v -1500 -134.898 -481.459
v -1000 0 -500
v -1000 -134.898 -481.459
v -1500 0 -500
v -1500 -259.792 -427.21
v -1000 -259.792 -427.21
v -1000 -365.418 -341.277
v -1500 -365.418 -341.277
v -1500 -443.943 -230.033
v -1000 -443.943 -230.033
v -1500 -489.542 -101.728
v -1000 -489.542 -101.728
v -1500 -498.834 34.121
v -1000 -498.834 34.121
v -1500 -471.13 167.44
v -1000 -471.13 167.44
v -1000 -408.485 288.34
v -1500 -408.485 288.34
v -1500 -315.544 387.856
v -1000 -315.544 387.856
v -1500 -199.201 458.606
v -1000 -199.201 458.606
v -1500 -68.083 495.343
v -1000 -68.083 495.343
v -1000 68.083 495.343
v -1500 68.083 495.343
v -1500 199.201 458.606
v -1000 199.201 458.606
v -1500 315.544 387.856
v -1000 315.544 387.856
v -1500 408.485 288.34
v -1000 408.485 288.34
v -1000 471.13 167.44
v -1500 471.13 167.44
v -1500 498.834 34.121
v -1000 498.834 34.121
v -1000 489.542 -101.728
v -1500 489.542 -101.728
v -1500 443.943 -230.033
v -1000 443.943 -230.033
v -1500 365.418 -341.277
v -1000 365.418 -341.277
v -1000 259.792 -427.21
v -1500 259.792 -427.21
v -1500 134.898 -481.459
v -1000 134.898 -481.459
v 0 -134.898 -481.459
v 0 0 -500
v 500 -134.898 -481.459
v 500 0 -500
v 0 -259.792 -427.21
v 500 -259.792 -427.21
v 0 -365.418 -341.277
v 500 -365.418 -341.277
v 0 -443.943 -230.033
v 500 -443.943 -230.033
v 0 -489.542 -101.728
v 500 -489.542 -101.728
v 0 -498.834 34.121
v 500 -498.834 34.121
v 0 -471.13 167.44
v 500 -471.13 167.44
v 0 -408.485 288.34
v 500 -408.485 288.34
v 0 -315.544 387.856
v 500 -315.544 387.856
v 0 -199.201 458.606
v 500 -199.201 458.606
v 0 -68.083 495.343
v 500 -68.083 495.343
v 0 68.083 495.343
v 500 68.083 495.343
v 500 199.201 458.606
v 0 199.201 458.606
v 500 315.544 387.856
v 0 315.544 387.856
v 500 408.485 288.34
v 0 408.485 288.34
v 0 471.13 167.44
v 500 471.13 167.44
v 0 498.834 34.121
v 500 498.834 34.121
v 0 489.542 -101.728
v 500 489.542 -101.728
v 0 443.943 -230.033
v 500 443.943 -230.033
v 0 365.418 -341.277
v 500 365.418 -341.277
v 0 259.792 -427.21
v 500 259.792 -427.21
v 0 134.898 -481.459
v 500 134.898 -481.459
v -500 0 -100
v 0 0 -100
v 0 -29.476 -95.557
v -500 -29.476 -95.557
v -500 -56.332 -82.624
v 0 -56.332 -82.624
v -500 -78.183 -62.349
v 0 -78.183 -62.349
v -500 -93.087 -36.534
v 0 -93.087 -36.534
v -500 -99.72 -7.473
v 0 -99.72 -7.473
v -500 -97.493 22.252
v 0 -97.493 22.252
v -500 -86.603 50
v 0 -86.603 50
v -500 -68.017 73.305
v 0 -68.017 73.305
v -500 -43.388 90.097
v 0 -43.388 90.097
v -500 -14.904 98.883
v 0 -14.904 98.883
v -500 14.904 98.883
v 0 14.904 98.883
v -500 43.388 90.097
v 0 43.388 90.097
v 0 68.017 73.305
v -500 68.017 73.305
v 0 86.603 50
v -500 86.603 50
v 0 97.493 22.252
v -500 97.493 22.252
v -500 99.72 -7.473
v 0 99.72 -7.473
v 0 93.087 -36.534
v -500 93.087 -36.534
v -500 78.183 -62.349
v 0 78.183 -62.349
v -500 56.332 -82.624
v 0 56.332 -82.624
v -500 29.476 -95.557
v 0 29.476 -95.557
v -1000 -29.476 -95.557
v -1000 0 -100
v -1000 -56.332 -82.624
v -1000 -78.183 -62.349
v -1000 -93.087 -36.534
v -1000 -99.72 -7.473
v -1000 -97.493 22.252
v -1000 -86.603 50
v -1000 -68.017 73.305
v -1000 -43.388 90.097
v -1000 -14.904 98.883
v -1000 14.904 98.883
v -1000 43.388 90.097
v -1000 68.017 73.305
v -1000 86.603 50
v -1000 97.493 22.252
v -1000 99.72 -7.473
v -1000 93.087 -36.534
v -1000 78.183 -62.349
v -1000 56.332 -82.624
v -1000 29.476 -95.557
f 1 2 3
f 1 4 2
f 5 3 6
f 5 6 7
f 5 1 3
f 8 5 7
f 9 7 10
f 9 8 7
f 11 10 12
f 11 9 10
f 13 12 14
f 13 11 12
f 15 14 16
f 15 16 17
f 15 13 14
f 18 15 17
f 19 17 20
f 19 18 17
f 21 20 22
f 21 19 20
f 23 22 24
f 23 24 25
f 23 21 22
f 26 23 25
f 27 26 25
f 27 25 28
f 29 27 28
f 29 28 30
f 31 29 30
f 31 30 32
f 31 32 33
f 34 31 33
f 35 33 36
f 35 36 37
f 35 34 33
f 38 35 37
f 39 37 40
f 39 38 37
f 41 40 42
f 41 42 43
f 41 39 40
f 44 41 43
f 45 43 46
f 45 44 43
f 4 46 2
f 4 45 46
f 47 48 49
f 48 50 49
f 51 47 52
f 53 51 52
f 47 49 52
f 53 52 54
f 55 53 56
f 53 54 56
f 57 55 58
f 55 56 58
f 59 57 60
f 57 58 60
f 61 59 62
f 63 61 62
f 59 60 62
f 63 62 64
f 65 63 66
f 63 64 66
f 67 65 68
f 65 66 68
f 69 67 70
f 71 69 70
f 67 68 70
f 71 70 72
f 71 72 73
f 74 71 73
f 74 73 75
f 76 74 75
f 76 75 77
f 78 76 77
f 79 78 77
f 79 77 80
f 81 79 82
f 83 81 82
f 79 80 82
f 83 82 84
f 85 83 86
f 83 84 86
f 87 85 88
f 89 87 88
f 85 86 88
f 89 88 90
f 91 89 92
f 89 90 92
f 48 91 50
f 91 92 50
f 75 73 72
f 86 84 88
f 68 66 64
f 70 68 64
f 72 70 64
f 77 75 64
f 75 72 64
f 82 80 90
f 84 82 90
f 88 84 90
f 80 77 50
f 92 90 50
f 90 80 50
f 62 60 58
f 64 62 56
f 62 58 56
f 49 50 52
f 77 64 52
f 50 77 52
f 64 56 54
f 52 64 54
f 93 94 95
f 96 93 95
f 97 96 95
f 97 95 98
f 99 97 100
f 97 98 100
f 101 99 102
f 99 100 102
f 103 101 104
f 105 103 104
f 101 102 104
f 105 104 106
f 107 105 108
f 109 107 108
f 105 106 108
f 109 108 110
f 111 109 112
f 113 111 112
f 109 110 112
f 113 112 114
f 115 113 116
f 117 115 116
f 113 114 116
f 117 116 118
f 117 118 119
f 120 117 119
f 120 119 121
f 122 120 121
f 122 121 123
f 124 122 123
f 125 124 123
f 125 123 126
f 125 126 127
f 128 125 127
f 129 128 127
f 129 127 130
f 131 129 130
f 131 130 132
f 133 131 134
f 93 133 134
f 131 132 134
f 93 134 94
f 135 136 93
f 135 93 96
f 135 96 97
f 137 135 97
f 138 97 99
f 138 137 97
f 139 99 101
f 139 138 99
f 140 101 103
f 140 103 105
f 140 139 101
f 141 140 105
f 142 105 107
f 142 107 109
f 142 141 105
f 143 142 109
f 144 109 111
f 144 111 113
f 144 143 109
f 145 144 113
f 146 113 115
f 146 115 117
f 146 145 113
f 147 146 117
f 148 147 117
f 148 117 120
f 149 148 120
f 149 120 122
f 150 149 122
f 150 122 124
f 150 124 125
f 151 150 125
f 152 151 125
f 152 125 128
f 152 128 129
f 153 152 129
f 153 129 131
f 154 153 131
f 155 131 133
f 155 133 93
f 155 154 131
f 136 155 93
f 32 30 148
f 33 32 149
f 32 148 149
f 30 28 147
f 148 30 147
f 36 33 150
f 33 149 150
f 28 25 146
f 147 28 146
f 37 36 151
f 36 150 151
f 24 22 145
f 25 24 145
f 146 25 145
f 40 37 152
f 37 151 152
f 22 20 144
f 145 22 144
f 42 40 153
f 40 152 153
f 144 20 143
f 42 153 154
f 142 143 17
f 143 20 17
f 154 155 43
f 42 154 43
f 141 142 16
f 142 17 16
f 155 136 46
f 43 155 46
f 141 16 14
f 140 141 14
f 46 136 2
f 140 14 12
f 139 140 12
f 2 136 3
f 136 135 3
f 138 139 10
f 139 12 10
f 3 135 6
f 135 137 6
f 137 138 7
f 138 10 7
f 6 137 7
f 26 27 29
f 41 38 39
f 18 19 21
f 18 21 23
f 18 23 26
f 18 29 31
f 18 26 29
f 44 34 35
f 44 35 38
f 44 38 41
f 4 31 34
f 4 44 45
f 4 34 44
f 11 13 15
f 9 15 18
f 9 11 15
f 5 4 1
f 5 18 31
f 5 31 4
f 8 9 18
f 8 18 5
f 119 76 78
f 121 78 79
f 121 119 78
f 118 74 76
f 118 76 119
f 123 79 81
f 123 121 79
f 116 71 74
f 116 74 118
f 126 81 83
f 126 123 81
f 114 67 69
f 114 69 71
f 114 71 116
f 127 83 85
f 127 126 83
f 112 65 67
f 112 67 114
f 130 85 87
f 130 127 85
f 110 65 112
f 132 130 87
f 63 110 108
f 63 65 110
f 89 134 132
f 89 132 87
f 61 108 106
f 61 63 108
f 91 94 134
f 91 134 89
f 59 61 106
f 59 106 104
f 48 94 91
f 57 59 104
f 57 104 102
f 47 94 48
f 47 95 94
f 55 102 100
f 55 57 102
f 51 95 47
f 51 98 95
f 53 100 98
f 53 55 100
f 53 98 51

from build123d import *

# Parameters (mm, degrees)
SKETCH_1_W   = 500
SKETCH_1_H   = 100
SKETCH_1_H_2 = 500


with BuildPart() as part:
    # ｽｹｯﾁ1 → 回転1 (revolve)
    with BuildSketch(Plane.XY, mode=Mode.PRIVATE) as revolve_1_sk:
        with Locations((-250, -50)):
            Rectangle(SKETCH_1_W, SKETCH_1_H)
        with Locations((250, -250)):
            Rectangle(SKETCH_1_W, SKETCH_1_H_2)
    revolve(revolve_1_sk.sketch.rotate(Axis((0, 0, 0), (-1, 0, 0)), 270), axis=Axis((0, 0, 0), (-1, 0, 0)))

    # ﾐﾗｰ1: part across plane


with BuildPart() as part_1:
    add(part.part)
    add(part.part.mirror(Plane(origin=(-500, 0, 0), x_dir=(0, 0, 1), z_dir=(1, 0, 0))))


solid = part_1.part
